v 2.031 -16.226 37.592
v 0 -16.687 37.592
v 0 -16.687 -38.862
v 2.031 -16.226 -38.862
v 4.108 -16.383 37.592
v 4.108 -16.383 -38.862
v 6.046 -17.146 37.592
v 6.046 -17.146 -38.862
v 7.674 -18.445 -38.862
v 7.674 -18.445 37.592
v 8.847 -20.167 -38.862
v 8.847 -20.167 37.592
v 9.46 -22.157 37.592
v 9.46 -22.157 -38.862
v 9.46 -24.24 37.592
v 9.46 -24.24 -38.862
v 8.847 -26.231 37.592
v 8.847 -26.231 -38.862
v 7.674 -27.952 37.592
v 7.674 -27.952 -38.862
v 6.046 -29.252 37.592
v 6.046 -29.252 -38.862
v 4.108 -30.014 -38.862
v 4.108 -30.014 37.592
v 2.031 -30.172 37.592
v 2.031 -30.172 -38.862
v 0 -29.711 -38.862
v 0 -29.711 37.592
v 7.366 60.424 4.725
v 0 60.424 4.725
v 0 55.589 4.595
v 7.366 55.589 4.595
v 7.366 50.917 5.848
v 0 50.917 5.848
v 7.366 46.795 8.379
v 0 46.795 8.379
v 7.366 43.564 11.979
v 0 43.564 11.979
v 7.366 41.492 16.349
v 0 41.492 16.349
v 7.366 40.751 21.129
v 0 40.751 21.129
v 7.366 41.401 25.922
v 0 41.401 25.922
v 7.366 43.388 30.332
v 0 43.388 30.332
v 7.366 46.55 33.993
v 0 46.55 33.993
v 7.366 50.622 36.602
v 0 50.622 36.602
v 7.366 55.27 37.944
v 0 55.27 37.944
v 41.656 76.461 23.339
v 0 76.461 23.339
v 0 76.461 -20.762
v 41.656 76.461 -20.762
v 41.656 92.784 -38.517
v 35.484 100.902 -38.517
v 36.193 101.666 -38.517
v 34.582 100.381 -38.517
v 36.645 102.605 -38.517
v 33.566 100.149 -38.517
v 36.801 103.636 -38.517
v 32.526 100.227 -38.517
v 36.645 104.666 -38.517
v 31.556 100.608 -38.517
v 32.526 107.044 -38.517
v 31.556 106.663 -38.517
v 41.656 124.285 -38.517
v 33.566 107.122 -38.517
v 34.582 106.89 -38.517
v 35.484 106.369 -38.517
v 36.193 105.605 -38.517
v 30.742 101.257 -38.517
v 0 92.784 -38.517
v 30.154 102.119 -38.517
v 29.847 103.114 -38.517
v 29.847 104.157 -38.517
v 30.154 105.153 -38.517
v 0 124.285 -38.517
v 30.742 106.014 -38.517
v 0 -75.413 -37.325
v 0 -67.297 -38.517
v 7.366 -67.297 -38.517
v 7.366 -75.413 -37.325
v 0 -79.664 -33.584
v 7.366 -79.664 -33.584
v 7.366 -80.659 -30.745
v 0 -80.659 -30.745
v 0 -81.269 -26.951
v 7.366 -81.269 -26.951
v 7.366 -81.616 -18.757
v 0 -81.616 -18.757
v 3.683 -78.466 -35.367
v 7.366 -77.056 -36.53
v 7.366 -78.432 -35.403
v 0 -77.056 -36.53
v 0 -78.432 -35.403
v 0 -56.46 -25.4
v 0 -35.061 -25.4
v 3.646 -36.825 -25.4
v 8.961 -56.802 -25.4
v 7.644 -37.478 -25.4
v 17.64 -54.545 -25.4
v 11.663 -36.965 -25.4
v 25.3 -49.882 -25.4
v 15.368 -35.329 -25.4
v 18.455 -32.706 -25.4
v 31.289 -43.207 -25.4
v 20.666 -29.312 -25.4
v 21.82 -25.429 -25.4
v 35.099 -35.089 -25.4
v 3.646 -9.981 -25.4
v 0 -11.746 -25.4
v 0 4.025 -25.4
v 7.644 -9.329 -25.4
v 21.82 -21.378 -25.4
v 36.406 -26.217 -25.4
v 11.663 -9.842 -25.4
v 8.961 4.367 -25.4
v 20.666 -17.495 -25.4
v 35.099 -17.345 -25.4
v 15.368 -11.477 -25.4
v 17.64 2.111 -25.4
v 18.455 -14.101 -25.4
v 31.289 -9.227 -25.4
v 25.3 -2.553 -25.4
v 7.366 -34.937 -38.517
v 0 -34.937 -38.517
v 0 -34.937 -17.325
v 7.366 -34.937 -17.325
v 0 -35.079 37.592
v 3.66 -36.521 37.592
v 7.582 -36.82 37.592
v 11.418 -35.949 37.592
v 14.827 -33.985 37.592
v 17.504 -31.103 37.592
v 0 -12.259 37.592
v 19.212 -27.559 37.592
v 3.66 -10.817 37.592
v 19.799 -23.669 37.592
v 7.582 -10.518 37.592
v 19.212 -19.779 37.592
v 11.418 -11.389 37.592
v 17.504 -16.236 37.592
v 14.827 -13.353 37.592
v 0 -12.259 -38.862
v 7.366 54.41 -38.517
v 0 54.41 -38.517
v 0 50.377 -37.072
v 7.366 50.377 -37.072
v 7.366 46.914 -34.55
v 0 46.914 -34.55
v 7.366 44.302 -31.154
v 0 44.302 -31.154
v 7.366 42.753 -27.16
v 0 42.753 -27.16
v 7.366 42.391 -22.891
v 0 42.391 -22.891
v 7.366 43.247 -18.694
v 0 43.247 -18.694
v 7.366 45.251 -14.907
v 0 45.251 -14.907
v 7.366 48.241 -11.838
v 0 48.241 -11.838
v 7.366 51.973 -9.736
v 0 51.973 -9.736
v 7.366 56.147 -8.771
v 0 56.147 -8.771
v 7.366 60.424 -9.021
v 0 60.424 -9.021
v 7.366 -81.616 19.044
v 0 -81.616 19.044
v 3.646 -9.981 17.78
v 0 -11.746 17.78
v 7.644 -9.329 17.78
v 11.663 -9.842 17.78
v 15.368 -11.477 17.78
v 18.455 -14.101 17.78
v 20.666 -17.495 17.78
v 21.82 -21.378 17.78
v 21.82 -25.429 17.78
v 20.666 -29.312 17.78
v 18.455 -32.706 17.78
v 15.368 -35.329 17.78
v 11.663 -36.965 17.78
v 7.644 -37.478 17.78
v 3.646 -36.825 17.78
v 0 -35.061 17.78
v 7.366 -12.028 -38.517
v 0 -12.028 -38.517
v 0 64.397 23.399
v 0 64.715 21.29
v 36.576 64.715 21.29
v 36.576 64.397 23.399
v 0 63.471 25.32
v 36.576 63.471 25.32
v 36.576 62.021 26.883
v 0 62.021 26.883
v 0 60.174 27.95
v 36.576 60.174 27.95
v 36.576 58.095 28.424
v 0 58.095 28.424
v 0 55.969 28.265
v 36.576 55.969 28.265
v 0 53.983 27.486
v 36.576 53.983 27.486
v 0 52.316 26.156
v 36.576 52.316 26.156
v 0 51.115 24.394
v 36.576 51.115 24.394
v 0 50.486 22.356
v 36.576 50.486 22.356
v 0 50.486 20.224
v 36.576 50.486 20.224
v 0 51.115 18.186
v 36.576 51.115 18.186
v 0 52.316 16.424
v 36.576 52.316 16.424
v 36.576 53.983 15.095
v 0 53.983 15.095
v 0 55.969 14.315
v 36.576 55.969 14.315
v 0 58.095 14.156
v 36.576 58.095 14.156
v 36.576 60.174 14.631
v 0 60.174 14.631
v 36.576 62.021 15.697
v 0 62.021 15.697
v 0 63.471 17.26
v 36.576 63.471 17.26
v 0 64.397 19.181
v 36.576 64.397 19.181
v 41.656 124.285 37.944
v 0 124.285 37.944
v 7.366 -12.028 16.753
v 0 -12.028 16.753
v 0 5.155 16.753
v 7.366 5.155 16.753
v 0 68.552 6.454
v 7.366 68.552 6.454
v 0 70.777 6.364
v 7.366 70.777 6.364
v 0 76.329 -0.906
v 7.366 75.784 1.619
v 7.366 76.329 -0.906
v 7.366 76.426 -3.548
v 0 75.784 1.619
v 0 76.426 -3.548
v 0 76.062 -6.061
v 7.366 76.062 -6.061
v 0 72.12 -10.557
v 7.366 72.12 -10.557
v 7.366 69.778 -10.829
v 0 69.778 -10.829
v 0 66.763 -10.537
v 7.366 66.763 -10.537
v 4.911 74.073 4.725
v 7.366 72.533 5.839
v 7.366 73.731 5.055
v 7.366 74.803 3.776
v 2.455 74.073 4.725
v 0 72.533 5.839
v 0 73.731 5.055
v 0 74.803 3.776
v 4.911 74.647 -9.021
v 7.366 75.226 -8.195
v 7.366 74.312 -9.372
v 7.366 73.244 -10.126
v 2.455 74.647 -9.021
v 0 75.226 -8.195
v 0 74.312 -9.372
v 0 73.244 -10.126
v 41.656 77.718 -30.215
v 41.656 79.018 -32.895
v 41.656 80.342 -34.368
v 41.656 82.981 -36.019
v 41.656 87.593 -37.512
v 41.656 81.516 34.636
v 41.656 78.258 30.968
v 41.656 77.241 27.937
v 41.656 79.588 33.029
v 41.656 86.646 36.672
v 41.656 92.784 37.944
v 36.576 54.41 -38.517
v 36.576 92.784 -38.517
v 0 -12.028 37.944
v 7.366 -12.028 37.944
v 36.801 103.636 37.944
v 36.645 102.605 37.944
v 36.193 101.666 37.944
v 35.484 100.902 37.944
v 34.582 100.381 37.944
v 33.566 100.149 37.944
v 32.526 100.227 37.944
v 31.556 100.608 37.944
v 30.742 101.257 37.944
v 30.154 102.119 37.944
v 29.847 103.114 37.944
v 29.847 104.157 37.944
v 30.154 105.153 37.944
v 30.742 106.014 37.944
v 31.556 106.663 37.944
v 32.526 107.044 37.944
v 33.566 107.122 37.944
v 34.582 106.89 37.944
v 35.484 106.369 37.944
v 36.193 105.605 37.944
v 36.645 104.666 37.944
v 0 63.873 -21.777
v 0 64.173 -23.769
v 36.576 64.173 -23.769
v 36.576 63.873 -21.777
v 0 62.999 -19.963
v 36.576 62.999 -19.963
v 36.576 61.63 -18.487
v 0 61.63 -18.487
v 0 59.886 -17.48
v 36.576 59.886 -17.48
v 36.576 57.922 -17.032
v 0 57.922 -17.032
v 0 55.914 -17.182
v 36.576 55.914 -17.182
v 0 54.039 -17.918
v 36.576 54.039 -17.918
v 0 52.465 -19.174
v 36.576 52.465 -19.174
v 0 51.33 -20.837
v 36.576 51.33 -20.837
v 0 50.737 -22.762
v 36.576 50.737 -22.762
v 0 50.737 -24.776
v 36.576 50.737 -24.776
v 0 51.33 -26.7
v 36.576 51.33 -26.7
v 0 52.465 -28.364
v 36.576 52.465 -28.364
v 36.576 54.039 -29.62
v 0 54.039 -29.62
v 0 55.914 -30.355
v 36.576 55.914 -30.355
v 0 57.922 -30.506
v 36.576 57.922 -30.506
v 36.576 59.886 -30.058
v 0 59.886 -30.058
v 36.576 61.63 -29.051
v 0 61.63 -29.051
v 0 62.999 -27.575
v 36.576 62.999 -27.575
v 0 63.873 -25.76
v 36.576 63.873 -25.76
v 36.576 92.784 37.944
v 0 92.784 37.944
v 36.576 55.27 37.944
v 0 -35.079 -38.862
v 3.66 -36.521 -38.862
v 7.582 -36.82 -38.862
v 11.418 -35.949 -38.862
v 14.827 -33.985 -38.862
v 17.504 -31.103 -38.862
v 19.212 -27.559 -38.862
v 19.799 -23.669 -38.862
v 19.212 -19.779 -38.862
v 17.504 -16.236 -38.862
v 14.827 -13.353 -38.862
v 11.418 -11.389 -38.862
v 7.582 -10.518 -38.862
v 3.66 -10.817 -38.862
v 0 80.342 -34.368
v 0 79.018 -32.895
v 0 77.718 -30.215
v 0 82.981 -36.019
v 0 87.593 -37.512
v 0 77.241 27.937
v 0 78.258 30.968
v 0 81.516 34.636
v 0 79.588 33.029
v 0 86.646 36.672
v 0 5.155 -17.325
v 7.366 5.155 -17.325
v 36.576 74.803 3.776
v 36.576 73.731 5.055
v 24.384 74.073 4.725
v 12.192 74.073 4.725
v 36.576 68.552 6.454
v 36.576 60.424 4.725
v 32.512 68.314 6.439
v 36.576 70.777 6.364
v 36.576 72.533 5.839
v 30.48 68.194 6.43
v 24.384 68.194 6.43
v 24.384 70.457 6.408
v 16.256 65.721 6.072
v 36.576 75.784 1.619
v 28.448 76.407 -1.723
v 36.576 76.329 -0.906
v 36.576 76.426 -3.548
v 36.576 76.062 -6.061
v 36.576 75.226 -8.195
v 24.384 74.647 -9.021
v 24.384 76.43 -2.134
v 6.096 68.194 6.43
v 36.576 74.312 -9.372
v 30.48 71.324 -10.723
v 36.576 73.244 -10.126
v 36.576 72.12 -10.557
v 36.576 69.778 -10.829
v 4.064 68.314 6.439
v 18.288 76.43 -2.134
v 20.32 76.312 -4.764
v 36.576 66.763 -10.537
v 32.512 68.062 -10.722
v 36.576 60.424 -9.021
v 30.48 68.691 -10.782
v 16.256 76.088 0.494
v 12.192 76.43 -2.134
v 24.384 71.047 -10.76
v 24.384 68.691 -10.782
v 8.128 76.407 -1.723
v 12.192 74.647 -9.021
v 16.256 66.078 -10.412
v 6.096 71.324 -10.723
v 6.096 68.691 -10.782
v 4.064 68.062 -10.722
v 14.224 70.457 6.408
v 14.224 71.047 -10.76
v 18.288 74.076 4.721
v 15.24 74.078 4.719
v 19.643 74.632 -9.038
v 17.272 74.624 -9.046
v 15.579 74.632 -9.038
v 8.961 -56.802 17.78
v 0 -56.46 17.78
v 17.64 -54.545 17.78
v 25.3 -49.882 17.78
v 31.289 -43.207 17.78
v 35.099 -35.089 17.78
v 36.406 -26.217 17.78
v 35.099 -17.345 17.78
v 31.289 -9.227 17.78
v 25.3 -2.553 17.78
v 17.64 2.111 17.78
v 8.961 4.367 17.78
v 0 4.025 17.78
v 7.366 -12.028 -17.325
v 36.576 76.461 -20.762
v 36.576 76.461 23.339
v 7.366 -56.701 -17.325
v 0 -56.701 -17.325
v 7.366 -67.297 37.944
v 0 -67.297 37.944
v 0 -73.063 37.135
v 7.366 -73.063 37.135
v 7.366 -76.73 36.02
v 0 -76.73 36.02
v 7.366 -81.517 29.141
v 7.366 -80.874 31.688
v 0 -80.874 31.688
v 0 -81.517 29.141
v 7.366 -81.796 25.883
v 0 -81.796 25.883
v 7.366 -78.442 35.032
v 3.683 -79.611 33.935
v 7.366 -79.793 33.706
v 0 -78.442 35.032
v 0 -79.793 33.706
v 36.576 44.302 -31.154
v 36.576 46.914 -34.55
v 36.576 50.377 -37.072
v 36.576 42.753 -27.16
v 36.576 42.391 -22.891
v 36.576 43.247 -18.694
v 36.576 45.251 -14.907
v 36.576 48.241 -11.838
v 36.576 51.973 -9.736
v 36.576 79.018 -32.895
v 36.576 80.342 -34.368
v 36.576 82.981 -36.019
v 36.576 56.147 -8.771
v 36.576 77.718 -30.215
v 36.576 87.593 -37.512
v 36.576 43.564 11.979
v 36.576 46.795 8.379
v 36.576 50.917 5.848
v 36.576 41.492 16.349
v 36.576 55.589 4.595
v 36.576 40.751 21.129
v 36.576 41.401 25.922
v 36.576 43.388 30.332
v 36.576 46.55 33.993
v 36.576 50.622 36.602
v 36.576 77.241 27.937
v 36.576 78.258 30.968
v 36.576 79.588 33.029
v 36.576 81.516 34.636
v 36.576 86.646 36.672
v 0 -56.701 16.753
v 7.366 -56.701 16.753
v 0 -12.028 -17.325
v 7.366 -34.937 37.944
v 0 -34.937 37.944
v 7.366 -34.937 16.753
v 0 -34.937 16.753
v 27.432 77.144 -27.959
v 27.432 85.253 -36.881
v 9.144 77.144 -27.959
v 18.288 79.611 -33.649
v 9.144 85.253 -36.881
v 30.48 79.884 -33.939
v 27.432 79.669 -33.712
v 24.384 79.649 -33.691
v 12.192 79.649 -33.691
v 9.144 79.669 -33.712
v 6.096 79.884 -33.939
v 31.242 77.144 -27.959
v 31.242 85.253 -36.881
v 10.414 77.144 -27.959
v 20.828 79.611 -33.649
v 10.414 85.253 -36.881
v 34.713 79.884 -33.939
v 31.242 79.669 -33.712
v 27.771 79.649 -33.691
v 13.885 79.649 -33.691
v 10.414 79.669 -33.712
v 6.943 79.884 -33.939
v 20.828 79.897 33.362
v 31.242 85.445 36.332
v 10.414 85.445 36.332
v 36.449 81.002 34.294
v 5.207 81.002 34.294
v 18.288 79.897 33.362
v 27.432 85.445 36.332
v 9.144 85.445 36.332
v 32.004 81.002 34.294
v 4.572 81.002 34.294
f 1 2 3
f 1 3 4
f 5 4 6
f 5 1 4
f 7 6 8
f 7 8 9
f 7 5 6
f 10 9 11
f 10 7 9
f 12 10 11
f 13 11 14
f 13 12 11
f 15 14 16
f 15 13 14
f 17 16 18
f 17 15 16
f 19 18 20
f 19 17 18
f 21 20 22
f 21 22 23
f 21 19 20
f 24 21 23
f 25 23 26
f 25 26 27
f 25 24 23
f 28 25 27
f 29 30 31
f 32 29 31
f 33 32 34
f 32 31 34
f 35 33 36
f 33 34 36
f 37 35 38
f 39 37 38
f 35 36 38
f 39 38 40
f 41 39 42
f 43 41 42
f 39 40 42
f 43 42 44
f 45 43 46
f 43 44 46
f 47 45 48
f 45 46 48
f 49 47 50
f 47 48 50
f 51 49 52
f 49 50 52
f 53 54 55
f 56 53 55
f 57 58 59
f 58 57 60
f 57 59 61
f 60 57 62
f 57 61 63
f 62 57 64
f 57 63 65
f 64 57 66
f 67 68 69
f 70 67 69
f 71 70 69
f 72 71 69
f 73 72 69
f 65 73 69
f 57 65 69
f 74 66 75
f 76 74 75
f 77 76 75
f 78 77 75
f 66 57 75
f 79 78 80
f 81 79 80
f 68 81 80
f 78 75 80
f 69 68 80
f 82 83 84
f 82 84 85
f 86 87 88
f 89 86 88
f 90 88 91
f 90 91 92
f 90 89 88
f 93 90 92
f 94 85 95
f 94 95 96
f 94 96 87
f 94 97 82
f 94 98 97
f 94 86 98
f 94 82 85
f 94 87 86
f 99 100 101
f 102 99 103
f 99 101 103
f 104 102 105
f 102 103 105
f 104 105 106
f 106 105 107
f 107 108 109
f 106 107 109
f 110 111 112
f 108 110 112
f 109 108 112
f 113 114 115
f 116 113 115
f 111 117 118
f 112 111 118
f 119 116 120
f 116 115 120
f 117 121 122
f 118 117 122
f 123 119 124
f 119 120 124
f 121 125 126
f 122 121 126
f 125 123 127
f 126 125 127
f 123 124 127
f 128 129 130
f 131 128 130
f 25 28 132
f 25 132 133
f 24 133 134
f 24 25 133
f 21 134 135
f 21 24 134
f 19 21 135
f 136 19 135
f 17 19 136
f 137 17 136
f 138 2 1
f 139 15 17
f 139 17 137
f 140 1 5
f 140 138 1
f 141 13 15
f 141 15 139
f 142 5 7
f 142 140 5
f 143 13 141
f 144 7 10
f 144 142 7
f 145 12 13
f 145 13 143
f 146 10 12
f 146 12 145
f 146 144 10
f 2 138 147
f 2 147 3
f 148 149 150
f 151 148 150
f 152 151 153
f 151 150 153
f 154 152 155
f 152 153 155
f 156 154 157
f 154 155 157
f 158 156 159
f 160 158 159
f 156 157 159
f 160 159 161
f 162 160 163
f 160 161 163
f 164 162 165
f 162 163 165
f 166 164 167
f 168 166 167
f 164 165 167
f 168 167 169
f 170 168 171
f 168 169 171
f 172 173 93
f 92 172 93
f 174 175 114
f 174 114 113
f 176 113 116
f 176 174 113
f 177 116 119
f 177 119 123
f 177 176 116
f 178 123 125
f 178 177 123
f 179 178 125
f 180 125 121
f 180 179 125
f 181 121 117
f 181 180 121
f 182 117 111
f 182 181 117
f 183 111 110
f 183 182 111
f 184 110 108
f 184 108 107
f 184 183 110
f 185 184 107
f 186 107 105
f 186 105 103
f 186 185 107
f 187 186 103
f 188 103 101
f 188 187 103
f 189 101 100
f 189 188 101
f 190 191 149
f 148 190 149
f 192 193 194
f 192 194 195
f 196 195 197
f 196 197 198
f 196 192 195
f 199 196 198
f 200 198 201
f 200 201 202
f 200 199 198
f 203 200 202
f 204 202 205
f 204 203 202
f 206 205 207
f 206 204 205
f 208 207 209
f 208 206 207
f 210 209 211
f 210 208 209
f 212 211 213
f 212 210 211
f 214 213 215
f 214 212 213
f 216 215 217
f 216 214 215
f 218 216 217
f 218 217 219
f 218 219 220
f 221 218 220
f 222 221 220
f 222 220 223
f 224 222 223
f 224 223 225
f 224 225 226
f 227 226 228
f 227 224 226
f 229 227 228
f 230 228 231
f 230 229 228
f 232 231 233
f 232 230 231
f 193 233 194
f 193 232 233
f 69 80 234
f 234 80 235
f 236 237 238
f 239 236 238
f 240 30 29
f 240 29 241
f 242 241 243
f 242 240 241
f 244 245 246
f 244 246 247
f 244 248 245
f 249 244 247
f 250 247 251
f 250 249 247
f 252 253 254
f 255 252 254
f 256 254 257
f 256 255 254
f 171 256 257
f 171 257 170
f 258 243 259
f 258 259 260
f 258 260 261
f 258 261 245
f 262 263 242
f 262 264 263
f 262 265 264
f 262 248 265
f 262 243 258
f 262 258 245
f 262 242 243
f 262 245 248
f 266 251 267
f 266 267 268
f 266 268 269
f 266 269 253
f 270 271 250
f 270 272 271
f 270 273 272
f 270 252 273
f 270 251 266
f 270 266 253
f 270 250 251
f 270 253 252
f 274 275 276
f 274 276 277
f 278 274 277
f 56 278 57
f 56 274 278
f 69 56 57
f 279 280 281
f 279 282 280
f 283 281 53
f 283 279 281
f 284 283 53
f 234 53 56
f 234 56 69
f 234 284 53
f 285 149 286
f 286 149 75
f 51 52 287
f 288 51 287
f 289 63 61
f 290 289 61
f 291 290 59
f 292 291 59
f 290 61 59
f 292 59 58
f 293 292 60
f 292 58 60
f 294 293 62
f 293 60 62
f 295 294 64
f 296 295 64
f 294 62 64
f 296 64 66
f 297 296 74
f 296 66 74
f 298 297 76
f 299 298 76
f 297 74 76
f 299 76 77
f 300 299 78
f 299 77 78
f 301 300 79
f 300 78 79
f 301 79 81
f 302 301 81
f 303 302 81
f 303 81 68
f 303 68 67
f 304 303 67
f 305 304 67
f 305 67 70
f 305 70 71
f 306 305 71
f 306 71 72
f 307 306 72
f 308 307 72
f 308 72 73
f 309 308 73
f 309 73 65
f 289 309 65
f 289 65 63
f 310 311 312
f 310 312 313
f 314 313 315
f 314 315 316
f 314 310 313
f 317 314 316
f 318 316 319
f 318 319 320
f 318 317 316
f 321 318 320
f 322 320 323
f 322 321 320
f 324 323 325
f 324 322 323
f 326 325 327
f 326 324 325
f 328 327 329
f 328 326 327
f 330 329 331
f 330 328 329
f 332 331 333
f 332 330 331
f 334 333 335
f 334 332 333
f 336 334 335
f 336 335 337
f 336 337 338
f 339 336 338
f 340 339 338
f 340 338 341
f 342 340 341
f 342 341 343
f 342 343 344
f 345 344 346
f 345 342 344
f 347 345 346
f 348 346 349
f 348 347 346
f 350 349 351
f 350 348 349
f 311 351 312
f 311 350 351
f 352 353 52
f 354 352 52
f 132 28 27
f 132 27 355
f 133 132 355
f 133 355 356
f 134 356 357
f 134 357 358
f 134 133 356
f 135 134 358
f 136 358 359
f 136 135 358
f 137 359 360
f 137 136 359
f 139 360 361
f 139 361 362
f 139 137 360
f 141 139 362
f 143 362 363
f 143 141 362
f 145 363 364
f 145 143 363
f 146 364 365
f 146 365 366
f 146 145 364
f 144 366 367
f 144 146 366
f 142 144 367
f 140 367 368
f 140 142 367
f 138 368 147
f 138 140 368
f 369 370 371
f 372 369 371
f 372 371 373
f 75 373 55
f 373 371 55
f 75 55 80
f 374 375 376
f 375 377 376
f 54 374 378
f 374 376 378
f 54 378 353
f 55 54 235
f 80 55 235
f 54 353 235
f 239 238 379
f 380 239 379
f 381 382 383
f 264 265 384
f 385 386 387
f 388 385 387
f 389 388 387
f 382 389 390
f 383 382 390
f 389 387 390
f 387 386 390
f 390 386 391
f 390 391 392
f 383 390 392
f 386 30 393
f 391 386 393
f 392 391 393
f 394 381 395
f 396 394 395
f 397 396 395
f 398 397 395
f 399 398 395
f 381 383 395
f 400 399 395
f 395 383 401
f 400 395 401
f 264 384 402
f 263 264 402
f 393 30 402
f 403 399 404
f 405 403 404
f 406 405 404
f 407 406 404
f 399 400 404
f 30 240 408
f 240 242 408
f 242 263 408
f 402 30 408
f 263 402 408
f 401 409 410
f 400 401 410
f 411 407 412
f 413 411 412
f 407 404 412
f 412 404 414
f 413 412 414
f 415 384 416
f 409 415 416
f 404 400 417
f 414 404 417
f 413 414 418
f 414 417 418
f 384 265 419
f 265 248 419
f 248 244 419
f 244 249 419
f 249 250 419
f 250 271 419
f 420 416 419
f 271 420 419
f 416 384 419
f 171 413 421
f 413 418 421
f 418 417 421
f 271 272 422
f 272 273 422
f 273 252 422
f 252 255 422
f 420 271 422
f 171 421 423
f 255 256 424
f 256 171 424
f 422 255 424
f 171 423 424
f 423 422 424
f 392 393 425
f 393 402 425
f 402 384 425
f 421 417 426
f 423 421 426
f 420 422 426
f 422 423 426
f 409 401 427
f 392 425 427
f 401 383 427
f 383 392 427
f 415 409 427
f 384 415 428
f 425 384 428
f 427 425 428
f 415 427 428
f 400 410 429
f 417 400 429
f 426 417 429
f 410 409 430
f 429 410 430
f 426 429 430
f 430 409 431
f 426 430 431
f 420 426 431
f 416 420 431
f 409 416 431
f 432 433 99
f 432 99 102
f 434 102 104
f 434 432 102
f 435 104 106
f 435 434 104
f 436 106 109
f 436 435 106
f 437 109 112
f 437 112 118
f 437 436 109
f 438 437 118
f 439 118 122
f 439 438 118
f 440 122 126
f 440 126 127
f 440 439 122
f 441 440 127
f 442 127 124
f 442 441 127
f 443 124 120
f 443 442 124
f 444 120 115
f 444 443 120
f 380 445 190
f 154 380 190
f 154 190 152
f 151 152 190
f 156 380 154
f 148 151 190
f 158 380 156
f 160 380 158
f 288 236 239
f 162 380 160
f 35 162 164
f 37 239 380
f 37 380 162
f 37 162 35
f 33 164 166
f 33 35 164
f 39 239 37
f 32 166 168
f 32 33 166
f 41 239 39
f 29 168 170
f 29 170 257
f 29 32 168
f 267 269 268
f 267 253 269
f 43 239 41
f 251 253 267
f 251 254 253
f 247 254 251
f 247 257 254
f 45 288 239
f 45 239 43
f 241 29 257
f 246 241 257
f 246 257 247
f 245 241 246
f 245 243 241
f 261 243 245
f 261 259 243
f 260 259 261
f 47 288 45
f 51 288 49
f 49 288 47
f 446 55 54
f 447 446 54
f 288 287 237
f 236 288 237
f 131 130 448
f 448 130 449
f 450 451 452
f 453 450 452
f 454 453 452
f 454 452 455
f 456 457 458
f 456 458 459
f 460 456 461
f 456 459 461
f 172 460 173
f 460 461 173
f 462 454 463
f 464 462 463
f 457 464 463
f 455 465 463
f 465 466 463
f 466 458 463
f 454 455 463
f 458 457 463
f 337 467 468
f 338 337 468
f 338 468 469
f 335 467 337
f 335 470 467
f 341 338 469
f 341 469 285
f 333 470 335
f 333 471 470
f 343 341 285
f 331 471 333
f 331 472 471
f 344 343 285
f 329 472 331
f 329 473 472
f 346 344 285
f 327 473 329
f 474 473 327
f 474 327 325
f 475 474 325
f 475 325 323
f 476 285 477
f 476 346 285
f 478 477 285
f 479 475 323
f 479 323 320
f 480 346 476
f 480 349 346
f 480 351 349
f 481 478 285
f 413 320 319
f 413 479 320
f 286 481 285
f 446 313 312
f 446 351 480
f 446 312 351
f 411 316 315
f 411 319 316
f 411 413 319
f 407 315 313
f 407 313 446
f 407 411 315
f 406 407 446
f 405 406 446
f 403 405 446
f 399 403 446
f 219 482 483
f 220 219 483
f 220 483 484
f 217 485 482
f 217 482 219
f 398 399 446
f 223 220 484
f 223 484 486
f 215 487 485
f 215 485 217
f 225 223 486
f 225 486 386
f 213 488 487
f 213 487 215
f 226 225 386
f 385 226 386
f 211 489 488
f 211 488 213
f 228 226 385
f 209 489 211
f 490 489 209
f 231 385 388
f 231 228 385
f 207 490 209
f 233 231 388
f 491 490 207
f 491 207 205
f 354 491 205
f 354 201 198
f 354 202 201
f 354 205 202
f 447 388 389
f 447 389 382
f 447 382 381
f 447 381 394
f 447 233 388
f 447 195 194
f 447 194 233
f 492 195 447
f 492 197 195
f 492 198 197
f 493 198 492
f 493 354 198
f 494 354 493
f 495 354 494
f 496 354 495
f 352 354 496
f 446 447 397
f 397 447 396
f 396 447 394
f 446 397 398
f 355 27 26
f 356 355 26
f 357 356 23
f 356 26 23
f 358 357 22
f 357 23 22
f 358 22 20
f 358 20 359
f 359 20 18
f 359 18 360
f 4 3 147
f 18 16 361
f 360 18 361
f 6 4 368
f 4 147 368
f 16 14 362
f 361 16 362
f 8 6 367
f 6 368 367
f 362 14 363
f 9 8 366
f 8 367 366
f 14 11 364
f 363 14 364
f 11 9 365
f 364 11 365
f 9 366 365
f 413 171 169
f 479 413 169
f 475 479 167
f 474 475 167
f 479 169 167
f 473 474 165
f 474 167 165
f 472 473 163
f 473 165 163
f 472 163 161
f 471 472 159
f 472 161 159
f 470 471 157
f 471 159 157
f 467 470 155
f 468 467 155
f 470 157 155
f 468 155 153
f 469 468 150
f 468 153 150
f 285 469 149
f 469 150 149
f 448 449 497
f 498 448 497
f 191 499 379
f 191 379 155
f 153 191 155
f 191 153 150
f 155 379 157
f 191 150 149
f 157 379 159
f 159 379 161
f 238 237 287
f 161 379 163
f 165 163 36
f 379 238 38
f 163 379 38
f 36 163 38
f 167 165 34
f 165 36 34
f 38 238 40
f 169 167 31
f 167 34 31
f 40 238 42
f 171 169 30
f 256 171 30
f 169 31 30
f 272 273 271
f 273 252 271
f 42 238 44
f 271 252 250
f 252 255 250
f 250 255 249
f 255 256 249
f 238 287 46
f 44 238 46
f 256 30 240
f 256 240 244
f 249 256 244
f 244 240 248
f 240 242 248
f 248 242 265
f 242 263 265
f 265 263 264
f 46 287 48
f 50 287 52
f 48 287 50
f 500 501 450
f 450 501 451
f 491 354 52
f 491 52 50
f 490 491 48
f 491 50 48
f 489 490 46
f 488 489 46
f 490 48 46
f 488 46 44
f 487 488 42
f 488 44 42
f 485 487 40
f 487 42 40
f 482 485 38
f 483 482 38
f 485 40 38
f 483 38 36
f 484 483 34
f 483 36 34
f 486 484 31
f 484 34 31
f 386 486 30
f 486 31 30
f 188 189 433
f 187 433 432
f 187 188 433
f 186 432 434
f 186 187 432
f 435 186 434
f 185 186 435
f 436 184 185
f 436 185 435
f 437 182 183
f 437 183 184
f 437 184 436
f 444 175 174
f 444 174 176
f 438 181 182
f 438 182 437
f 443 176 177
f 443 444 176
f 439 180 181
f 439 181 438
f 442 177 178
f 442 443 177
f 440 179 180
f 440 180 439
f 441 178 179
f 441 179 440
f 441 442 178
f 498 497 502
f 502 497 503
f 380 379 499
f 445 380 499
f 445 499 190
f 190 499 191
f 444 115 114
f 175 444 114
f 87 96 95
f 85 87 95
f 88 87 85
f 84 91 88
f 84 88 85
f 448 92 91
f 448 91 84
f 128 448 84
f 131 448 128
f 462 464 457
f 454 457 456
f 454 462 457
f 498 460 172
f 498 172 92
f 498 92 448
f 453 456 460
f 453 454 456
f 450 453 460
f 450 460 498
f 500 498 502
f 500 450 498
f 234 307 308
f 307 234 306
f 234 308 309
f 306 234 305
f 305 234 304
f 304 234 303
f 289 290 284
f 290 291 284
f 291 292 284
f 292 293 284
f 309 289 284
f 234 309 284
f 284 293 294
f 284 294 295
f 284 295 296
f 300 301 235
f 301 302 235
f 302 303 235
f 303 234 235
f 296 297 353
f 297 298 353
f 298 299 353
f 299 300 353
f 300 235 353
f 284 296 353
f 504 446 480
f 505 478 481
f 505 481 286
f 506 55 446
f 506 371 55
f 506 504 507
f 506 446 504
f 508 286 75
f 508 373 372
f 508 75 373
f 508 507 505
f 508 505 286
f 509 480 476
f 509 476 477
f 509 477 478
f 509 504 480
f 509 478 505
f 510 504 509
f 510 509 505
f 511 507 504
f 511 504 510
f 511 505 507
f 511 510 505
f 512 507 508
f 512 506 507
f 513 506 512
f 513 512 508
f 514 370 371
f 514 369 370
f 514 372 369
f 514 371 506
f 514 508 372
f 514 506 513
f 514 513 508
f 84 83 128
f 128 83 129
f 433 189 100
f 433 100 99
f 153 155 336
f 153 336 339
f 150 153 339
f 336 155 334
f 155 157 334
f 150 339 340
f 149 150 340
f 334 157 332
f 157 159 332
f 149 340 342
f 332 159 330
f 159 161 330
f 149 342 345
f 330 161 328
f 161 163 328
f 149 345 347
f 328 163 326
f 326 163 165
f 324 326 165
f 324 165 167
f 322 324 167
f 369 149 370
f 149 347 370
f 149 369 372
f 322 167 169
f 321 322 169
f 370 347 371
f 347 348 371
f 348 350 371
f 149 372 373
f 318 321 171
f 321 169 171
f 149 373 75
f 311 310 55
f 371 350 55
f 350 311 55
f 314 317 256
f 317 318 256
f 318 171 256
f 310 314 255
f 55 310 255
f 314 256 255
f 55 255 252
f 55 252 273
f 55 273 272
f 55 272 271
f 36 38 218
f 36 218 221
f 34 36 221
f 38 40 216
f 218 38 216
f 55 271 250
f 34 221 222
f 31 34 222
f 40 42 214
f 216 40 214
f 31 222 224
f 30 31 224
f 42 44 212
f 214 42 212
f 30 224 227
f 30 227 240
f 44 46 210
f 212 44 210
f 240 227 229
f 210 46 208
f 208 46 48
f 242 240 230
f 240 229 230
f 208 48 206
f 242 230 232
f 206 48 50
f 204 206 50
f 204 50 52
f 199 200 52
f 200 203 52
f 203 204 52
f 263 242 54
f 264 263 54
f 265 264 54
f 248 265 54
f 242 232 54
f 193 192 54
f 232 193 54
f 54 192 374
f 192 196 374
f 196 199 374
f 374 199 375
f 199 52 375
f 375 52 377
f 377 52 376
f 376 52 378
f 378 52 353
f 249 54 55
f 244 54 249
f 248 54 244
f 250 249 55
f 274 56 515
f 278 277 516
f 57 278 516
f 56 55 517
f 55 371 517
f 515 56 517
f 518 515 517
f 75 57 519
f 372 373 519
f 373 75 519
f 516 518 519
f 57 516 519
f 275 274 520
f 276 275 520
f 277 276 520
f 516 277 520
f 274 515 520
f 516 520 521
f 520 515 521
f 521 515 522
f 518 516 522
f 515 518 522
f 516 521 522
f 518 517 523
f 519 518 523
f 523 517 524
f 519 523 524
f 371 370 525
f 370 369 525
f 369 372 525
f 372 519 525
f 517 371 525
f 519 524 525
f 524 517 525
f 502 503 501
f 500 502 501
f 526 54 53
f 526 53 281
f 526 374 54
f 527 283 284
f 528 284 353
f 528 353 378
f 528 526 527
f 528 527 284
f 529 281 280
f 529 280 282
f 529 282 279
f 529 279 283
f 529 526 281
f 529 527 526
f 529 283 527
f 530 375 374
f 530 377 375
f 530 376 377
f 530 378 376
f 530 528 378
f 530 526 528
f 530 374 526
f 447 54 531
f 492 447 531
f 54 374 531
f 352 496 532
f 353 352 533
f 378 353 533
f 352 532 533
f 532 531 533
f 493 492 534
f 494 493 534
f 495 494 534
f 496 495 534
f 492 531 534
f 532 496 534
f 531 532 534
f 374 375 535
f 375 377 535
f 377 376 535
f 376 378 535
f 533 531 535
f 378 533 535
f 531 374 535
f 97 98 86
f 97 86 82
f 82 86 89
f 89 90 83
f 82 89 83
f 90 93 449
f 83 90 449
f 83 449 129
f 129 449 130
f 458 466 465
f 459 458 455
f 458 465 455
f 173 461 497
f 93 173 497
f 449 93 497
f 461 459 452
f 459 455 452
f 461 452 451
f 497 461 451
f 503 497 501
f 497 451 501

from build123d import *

# Parameters (mm, degrees)
F1_DEPTH  = 41.656
F2_DEPTH  = 7.366
F0_R      = 6.755967202
F0_R_2    = 7.1540660552
F3_DEPTH  = 36.576
F5_R      = 3.4962937173
F6_DEPTH  = 76.962
F11_DEPTH = 43.18
F12_DEPTH = 76.454


with BuildPart() as f1:
    # F0 (on Right) → F1 (new body)
    with BuildSketch(Plane.YZ):
        with BuildLine():
            Line((124.284863472, 37.9441045225), (92.7840918303, 37.9441045225))
            add(Edge.make_bspline(
                [(76.4609649777, 23.3392044902), (76.9895934803, 27.1475551039), (78.1188161003, 35.2827117164), (87.6922932924, 37.0200662536), (92.7840918303, 37.9441045225)],
                knots=[0, 0, 0, 0, 0.468134886, 1, 1, 1, 1], degree=3))
            Line((76.4609649777, 23.3392044902), (76.4609649777, -20.7618735731))
            add(Edge.make_bspline(
                [(76.4609649777, -20.7618735731), (76.7180250693, -25.7273470106), (77.2395732538, -35.8017760714), (87.5536206775, -37.6032749156), (92.7840918303, -38.5168530047)],
                knots=[0, 0, 0, 0, 0.4928788925, 1, 1, 1, 1], degree=3))
            Line((92.7840918303, -38.5168530047), (124.284863472, -38.5168530047))
            Line((124.284863472, -38.5168530047), (124.284863472, 37.9441045225))
        make_face()
    extrude(amount=F1_DEPTH)

    # F5 (on offset) → F6 (cut)
    with BuildSketch(Plane(origin=(0, 0, -38.7708530047), x_dir=(1, 0, 0), z_dir=(0, 0, -1))):
        with Locations((33.3044752479, -103.6355346441)):
            Circle(F5_R)
    extrude(amount=-F6_DEPTH, mode=Mode.SUBTRACT)


with BuildPart() as f2:
    # F0 (on Right) → F2 (new body)
    with BuildSketch(Plane.YZ):
        with BuildLine():
            ThreePointArc((60.4242049158, 4.7251125798), (40.9485352592, 18.7124540736), (55.2695356309, 37.9441045225))
            Line((55.2695356309, 37.9441045225), (-12.0275653899, 37.9441045225))
            Line((-12.0275653899, 37.9441045225), (-12.0275653899, 16.752678901))
            Line((-12.0275653899, 16.752678901), (5.1546725444, 16.752678901))
            Line((5.1546725444, 16.752678901), (5.1546725444, -17.3254273832))
            Line((5.1546725444, -17.3254273832), (-12.0275653899, -17.3254273832))
            Line((-12.0275653899, -17.3254273832), (-12.0275653899, -38.5168530047))
            Line((-12.0275653899, -38.5168530047), (54.4104210101, -38.5168530047))
            ThreePointArc((54.4104210101, -38.5168530047), (42.6692253444, -20.7618734334), (60.4242049158, -9.0206777677))
            add(Edge.make_bspline(
                [(60.4242049158, 4.7251125798), (65.8143502447, 6.2401412629), (76.6162017435, 9.2762588168), (77.6322797861, -13.6921261943), (66.1918946871, -10.5864232395), (60.4242049158, -9.0206777677)],
                knots=[0, 0, 0, 0, 0.3305989505, 0.6625203127, 1, 1, 1, 1], degree=3))
        make_face()
    extrude(amount=F2_DEPTH)


with BuildPart() as f2b:
    # F0 (on Right) → F2, piece 2 (new body)
    with BuildSketch(Plane.YZ):
        with BuildLine():
            Line((-34.9372178316, 16.752678901), (-34.9372178316, 37.9441045225))
            Line((-34.9372178316, 37.9441045225), (-67.2971010208, 37.9441045225))
            add(Edge.make_bspline(
                [(-67.2971010208, 37.9441045225), (-72.2404657293, 37.3952796442), (-82.5086018901, 36.2552851443), (-81.9205708818, 24.9211921025), (-81.6156342626, 19.0436448902)],
                knots=[0, 0, 0, 0, 0.4814276545, 1, 1, 1, 1], degree=3))
            Line((-81.6156342626, 19.0436448902), (-81.6156342626, -18.7572799623))
            add(Edge.make_bspline(
                [(-67.2971010208, -38.5168530047), (-71.6662403179, -38.2681333646), (-81.3089337723, -37.7192089467), (-81.5072020558, -25.4611616643), (-81.6156342626, -18.7572799623)],
                knots=[0, 0, 0, 0, 0.4531036186, 1, 1, 1, 1], degree=3))
            Line((-67.2971010208, -38.5168530047), (-34.9372178316, -38.5168530047))
            Line((-34.9372178316, -38.5168530047), (-34.9372178316, -17.3254273832))
            Line((-34.9372178316, -17.3254273832), (-56.7013844848, -17.3254273832))
            Line((-56.7013844848, -17.3254273832), (-56.7013844848, 16.752678901))
            Line((-56.7013844848, 16.752678901), (-34.9372178316, 16.752678901))
        make_face()
    extrude(amount=F2_DEPTH)


with BuildPart() as f3:
    # F0 (on Right) → F3 (new body)
    with BuildSketch(Plane.YZ):
        with BuildLine():
            Line((92.7840918303, 37.9441045225), (59.8514638841, 37.9441045225))
            Line((59.8514638841, 37.9441045225), (55.2695356309, 37.9441045225))
            ThreePointArc((55.2695356309, 37.9441045225), (40.9485352592, 18.7124540736), (60.4242049158, 4.7251125798))
            add(Edge.make_bspline(
                [(60.4242049158, 4.7251125798), (65.8143502447, 6.2401412629), (76.6162017435, 9.2762588168), (77.6322797861, -13.6921261943), (66.1918946871, -10.5864232395), (60.4242049158, -9.0206777677)],
                knots=[0, 0, 0, 0, 0.3305989505, 0.6625203127, 1, 1, 1, 1], degree=3))
            ThreePointArc((60.4242049158, -9.0206777677), (42.6692253444, -20.7618734334), (54.4104210101, -38.5168530047))
            Line((54.4104210101, -38.5168530047), (60.4242049158, -38.5168530047))
            Line((60.4242049158, -38.5168530047), (92.7840918303, -38.5168530047))
            add(Edge.make_bspline(
                [(76.4609649777, -20.7618735731), (76.7180250693, -25.7273470106), (77.2395732538, -35.8017760714), (87.5536206775, -37.6032749156), (92.7840918303, -38.5168530047)],
                knots=[0, 0, 0, 0, 0.4928788925, 1, 1, 1, 1], degree=3))
            Line((76.4609649777, -20.7618735731), (76.4609649777, 23.3392044902))
            add(Edge.make_bspline(
                [(76.4609649777, 23.3392044902), (76.9895934803, 27.1475551039), (78.1188161003, 35.2827117164), (87.6922932924, 37.0200662536), (92.7840918303, 37.9441045225)],
                knots=[0, 0, 0, 0, 0.468134886, 1, 1, 1, 1], degree=3))
        make_face()
        with Locations((57.4173129629, -23.7687653862)):
            Circle(F0_R, mode=Mode.SUBTRACT)
        with Locations((57.5604997575, 21.2901717631)):
            Circle(F0_R_2, mode=Mode.SUBTRACT)
    extrude(amount=F3_DEPTH)


with BuildPart() as f11:
    # F8 (on offset) → F11 (new body)
    with BuildSketch(Plane.XY.offset(17.78)):
        with BuildLine():
            Line((0, -35.0608862936), (0, -56.459903717))
            ThreePointArc((0, -56.459903717), (36.4058124739, -26.2173388619), (0, 4.0252259932))
            Line((0, 4.0252259932), (0, -11.7455562577))
            ThreePointArc((0, -11.7455562577), (21.9665194179, -23.4032212757), (0, -35.0608862936))
        make_face()
    extrude(amount=-F11_DEPTH)


with BuildPart() as f12:
    # F10 (on offset) → F12 (new body)
    with BuildSketch(Plane.XY.offset(37.592)):
        with BuildLine():
            ThreePointArc((0, -16.6867468506), (9.5384043978, -23.1987070292), (0, -29.7106672078))
            Line((0, -29.7106672078), (0, -35.0786559284))
            ThreePointArc((0, -35.0786559284), (19.7988561915, -23.6690286547), (0, -12.259401381))
            Line((0, -12.259401381), (0, -16.6867468506))
        make_face()
    extrude(amount=-F12_DEPTH)


solid = Compound([f1.part, f2.part, f2b.part, f3.part, f11.part, f12.part])
